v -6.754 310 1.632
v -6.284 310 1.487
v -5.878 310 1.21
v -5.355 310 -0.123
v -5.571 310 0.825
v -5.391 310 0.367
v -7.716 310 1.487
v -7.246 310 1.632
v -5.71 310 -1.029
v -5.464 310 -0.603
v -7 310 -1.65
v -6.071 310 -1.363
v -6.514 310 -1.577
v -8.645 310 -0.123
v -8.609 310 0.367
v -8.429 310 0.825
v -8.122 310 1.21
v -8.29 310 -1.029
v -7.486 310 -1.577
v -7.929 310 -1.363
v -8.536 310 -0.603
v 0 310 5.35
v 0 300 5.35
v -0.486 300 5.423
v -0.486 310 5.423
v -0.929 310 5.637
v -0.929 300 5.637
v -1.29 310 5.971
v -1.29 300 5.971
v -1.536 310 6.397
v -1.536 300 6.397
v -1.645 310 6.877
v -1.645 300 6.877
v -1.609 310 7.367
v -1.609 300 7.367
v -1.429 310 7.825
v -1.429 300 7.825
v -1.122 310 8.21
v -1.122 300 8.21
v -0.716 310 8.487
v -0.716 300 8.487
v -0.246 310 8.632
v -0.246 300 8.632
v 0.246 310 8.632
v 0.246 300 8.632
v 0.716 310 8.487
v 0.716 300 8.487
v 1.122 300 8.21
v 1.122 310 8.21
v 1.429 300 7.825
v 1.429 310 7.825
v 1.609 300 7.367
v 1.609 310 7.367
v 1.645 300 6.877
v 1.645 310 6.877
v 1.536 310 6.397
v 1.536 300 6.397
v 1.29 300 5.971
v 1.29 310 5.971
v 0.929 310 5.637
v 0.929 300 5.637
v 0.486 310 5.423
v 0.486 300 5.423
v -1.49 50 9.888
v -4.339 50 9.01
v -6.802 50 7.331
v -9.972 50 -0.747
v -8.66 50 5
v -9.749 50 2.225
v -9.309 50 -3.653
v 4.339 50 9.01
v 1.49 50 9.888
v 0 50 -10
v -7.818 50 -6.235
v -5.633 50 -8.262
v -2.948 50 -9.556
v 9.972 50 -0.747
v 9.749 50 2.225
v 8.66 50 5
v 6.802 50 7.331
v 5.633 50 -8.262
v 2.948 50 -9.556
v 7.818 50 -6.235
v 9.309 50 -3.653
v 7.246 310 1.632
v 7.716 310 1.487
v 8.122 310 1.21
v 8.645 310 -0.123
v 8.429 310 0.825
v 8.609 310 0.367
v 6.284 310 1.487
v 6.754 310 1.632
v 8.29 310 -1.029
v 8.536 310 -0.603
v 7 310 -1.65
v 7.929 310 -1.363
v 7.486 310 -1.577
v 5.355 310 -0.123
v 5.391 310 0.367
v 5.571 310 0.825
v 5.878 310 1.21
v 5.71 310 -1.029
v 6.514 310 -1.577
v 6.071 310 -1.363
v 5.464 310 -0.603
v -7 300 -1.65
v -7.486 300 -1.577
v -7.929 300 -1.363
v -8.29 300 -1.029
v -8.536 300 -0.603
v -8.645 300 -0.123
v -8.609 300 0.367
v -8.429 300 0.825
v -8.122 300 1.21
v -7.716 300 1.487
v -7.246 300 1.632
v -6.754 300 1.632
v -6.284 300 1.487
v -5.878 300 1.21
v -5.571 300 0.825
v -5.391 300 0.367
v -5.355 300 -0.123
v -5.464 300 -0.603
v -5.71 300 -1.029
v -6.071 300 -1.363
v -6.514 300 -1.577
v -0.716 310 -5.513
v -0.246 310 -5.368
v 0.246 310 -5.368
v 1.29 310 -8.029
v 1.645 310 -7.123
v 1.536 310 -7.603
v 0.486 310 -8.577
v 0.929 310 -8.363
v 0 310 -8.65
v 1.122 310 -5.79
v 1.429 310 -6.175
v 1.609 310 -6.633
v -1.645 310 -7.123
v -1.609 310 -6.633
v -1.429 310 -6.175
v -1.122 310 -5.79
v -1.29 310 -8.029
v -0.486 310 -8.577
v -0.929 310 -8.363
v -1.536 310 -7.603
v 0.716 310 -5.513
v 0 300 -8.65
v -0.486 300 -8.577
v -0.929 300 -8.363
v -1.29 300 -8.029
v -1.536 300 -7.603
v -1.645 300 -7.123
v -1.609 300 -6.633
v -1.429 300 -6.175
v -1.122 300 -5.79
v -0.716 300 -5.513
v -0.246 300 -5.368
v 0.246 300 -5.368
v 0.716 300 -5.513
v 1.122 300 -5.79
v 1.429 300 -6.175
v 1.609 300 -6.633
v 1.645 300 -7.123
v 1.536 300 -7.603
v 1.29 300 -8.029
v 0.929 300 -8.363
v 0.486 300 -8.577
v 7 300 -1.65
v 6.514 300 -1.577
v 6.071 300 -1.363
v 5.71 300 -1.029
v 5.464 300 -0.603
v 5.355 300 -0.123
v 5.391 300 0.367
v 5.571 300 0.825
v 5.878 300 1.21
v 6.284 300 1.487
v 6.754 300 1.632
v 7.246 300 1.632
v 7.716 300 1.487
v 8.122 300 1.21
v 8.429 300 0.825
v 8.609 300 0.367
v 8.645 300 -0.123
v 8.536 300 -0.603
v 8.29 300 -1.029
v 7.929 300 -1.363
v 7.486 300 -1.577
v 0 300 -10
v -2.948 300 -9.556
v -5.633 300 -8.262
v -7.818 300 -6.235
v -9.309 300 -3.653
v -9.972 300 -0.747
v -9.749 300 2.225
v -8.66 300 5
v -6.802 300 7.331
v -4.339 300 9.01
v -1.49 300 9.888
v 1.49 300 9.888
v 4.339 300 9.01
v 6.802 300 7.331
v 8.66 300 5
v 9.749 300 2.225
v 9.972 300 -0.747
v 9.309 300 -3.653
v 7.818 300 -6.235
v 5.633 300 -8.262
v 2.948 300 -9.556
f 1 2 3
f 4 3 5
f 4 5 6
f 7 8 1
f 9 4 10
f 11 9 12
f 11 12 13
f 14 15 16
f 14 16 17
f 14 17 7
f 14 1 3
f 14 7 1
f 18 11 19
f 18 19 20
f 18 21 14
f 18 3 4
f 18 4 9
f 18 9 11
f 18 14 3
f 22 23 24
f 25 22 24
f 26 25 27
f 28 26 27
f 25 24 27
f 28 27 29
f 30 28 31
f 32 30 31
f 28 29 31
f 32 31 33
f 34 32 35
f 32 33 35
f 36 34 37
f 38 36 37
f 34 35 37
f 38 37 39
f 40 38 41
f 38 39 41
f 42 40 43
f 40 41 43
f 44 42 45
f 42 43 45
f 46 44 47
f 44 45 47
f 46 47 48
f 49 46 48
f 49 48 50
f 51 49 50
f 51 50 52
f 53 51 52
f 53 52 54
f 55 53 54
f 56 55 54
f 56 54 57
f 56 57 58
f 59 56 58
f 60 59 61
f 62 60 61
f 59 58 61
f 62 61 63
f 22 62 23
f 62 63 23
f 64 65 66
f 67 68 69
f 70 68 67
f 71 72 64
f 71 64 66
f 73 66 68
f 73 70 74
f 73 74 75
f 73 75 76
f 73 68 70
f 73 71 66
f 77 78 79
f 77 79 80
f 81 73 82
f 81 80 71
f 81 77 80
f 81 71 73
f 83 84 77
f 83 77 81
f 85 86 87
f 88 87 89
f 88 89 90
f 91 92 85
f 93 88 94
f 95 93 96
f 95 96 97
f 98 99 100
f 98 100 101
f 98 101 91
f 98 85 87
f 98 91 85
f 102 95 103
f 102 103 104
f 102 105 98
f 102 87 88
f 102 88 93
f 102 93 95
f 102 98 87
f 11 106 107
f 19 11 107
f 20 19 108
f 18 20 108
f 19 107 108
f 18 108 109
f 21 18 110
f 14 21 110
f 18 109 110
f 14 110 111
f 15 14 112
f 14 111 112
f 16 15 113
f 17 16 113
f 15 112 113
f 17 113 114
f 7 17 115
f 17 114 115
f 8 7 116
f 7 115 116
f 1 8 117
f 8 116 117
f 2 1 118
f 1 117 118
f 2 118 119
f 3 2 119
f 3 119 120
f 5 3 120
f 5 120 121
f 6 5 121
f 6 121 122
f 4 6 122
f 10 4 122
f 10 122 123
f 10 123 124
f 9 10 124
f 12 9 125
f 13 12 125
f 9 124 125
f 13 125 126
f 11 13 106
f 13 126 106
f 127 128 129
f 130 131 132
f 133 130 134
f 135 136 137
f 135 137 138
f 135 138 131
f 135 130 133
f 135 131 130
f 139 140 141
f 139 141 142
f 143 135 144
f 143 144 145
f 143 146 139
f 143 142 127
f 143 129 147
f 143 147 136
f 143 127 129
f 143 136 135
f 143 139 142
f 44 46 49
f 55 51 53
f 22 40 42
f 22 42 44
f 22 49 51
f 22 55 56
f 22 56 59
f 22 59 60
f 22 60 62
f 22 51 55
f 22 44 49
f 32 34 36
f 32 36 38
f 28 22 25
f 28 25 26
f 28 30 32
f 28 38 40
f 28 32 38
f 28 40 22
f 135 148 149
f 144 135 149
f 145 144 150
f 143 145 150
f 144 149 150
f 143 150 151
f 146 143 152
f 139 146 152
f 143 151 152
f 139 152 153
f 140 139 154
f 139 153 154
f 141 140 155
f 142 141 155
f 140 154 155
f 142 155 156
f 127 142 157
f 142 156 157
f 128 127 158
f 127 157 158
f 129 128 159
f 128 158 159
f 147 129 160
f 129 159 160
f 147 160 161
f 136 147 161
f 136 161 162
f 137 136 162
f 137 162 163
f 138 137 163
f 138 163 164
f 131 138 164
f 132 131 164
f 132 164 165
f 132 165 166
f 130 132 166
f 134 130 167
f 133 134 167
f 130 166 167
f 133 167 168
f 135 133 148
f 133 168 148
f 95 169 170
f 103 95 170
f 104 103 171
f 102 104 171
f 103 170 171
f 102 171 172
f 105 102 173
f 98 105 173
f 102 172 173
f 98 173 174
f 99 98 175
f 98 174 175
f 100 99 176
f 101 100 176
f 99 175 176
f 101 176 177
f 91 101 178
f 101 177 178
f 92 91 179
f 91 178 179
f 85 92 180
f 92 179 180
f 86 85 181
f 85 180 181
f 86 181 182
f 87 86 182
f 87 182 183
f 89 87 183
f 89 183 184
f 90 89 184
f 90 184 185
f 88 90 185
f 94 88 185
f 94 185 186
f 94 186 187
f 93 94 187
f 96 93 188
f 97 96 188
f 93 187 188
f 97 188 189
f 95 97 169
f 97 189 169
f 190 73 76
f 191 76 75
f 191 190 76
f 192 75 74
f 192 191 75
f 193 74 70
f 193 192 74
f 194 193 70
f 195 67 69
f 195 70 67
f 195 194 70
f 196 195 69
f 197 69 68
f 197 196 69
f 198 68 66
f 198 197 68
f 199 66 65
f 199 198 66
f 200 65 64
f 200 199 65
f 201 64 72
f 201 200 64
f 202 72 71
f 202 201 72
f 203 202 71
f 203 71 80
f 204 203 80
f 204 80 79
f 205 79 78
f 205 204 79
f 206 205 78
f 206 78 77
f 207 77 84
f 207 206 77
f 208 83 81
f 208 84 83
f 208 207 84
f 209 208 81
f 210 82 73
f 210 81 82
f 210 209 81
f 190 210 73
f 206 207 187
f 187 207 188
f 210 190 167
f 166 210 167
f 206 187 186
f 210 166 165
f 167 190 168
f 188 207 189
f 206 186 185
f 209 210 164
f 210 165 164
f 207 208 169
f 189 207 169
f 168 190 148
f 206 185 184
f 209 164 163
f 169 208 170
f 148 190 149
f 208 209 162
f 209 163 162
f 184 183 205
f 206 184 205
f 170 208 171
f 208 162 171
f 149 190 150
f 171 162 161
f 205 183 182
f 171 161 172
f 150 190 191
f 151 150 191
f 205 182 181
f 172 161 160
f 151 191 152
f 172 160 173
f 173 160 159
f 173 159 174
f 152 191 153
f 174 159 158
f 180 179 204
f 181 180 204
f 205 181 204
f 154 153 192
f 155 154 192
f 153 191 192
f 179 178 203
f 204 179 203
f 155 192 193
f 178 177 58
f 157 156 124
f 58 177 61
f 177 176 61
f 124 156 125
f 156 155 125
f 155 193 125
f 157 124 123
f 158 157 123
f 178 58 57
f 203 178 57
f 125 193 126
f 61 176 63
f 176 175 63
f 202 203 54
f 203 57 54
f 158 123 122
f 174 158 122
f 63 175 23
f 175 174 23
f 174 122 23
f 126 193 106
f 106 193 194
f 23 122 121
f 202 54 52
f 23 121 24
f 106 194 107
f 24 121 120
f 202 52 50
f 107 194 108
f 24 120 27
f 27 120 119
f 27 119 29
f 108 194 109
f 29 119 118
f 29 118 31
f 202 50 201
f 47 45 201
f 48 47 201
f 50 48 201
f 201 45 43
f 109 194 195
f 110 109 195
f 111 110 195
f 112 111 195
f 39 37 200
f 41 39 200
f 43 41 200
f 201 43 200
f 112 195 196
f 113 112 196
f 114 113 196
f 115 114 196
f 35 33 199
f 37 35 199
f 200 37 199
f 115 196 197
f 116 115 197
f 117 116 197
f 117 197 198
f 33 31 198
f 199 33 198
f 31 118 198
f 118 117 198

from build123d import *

# Parameters (mm, degrees)
SKETCH_1_W          = 10
SKETCH_1_H          = 300
SKETCH_2_R          = 1.65
EXTRUDE_1_DEPTH     = 10
SKETCH_3_R          = 10
CUT_EXTRUDE_1_DEPTH = 50


with BuildPart() as part:
    # 草图1 → 旋转1 (revolve)
    with BuildSketch(Plane.XY, mode=Mode.PRIVATE) as revolve_1_sk:
        with Locations((5, 150)):
            Rectangle(SKETCH_1_W, SKETCH_1_H)
    revolve(revolve_1_sk.sketch.rotate(Axis((0, 0, 0), (0, 1, 0)), 90), axis=Axis((0, 0, 0), (0, 1, 0)))

    # 草图2 → 凸台-拉伸1 (add)
    with BuildSketch(Plane(origin=(0, 300, 0), x_dir=(1, 0, 0), z_dir=(0, 1, 0))):
        with Locations(Location((7, 0, 0), (0, 0, 90))):
            Circle(SKETCH_2_R)
        with Locations(Location((0, -7, 0), (0, 0, 90))):
            Circle(SKETCH_2_R)
        with Locations(Location((-7, 0, 0), (0, 0, 90))):
            Circle(SKETCH_2_R)
        with Locations(Location((0, 7, 0), (0, 0, 90))):
            Circle(SKETCH_2_R)
    extrude(amount=EXTRUDE_1_DEPTH)

    # 草图3 → 切除-拉伸1 (cut)
    with BuildSketch(Plane.XZ):
        with Locations(Location((0, 0, 0), (0, 0, 270))):
            Circle(SKETCH_3_R)
    extrude(amount=-CUT_EXTRUDE_1_DEPTH, mode=Mode.SUBTRACT)


solid = part.part
